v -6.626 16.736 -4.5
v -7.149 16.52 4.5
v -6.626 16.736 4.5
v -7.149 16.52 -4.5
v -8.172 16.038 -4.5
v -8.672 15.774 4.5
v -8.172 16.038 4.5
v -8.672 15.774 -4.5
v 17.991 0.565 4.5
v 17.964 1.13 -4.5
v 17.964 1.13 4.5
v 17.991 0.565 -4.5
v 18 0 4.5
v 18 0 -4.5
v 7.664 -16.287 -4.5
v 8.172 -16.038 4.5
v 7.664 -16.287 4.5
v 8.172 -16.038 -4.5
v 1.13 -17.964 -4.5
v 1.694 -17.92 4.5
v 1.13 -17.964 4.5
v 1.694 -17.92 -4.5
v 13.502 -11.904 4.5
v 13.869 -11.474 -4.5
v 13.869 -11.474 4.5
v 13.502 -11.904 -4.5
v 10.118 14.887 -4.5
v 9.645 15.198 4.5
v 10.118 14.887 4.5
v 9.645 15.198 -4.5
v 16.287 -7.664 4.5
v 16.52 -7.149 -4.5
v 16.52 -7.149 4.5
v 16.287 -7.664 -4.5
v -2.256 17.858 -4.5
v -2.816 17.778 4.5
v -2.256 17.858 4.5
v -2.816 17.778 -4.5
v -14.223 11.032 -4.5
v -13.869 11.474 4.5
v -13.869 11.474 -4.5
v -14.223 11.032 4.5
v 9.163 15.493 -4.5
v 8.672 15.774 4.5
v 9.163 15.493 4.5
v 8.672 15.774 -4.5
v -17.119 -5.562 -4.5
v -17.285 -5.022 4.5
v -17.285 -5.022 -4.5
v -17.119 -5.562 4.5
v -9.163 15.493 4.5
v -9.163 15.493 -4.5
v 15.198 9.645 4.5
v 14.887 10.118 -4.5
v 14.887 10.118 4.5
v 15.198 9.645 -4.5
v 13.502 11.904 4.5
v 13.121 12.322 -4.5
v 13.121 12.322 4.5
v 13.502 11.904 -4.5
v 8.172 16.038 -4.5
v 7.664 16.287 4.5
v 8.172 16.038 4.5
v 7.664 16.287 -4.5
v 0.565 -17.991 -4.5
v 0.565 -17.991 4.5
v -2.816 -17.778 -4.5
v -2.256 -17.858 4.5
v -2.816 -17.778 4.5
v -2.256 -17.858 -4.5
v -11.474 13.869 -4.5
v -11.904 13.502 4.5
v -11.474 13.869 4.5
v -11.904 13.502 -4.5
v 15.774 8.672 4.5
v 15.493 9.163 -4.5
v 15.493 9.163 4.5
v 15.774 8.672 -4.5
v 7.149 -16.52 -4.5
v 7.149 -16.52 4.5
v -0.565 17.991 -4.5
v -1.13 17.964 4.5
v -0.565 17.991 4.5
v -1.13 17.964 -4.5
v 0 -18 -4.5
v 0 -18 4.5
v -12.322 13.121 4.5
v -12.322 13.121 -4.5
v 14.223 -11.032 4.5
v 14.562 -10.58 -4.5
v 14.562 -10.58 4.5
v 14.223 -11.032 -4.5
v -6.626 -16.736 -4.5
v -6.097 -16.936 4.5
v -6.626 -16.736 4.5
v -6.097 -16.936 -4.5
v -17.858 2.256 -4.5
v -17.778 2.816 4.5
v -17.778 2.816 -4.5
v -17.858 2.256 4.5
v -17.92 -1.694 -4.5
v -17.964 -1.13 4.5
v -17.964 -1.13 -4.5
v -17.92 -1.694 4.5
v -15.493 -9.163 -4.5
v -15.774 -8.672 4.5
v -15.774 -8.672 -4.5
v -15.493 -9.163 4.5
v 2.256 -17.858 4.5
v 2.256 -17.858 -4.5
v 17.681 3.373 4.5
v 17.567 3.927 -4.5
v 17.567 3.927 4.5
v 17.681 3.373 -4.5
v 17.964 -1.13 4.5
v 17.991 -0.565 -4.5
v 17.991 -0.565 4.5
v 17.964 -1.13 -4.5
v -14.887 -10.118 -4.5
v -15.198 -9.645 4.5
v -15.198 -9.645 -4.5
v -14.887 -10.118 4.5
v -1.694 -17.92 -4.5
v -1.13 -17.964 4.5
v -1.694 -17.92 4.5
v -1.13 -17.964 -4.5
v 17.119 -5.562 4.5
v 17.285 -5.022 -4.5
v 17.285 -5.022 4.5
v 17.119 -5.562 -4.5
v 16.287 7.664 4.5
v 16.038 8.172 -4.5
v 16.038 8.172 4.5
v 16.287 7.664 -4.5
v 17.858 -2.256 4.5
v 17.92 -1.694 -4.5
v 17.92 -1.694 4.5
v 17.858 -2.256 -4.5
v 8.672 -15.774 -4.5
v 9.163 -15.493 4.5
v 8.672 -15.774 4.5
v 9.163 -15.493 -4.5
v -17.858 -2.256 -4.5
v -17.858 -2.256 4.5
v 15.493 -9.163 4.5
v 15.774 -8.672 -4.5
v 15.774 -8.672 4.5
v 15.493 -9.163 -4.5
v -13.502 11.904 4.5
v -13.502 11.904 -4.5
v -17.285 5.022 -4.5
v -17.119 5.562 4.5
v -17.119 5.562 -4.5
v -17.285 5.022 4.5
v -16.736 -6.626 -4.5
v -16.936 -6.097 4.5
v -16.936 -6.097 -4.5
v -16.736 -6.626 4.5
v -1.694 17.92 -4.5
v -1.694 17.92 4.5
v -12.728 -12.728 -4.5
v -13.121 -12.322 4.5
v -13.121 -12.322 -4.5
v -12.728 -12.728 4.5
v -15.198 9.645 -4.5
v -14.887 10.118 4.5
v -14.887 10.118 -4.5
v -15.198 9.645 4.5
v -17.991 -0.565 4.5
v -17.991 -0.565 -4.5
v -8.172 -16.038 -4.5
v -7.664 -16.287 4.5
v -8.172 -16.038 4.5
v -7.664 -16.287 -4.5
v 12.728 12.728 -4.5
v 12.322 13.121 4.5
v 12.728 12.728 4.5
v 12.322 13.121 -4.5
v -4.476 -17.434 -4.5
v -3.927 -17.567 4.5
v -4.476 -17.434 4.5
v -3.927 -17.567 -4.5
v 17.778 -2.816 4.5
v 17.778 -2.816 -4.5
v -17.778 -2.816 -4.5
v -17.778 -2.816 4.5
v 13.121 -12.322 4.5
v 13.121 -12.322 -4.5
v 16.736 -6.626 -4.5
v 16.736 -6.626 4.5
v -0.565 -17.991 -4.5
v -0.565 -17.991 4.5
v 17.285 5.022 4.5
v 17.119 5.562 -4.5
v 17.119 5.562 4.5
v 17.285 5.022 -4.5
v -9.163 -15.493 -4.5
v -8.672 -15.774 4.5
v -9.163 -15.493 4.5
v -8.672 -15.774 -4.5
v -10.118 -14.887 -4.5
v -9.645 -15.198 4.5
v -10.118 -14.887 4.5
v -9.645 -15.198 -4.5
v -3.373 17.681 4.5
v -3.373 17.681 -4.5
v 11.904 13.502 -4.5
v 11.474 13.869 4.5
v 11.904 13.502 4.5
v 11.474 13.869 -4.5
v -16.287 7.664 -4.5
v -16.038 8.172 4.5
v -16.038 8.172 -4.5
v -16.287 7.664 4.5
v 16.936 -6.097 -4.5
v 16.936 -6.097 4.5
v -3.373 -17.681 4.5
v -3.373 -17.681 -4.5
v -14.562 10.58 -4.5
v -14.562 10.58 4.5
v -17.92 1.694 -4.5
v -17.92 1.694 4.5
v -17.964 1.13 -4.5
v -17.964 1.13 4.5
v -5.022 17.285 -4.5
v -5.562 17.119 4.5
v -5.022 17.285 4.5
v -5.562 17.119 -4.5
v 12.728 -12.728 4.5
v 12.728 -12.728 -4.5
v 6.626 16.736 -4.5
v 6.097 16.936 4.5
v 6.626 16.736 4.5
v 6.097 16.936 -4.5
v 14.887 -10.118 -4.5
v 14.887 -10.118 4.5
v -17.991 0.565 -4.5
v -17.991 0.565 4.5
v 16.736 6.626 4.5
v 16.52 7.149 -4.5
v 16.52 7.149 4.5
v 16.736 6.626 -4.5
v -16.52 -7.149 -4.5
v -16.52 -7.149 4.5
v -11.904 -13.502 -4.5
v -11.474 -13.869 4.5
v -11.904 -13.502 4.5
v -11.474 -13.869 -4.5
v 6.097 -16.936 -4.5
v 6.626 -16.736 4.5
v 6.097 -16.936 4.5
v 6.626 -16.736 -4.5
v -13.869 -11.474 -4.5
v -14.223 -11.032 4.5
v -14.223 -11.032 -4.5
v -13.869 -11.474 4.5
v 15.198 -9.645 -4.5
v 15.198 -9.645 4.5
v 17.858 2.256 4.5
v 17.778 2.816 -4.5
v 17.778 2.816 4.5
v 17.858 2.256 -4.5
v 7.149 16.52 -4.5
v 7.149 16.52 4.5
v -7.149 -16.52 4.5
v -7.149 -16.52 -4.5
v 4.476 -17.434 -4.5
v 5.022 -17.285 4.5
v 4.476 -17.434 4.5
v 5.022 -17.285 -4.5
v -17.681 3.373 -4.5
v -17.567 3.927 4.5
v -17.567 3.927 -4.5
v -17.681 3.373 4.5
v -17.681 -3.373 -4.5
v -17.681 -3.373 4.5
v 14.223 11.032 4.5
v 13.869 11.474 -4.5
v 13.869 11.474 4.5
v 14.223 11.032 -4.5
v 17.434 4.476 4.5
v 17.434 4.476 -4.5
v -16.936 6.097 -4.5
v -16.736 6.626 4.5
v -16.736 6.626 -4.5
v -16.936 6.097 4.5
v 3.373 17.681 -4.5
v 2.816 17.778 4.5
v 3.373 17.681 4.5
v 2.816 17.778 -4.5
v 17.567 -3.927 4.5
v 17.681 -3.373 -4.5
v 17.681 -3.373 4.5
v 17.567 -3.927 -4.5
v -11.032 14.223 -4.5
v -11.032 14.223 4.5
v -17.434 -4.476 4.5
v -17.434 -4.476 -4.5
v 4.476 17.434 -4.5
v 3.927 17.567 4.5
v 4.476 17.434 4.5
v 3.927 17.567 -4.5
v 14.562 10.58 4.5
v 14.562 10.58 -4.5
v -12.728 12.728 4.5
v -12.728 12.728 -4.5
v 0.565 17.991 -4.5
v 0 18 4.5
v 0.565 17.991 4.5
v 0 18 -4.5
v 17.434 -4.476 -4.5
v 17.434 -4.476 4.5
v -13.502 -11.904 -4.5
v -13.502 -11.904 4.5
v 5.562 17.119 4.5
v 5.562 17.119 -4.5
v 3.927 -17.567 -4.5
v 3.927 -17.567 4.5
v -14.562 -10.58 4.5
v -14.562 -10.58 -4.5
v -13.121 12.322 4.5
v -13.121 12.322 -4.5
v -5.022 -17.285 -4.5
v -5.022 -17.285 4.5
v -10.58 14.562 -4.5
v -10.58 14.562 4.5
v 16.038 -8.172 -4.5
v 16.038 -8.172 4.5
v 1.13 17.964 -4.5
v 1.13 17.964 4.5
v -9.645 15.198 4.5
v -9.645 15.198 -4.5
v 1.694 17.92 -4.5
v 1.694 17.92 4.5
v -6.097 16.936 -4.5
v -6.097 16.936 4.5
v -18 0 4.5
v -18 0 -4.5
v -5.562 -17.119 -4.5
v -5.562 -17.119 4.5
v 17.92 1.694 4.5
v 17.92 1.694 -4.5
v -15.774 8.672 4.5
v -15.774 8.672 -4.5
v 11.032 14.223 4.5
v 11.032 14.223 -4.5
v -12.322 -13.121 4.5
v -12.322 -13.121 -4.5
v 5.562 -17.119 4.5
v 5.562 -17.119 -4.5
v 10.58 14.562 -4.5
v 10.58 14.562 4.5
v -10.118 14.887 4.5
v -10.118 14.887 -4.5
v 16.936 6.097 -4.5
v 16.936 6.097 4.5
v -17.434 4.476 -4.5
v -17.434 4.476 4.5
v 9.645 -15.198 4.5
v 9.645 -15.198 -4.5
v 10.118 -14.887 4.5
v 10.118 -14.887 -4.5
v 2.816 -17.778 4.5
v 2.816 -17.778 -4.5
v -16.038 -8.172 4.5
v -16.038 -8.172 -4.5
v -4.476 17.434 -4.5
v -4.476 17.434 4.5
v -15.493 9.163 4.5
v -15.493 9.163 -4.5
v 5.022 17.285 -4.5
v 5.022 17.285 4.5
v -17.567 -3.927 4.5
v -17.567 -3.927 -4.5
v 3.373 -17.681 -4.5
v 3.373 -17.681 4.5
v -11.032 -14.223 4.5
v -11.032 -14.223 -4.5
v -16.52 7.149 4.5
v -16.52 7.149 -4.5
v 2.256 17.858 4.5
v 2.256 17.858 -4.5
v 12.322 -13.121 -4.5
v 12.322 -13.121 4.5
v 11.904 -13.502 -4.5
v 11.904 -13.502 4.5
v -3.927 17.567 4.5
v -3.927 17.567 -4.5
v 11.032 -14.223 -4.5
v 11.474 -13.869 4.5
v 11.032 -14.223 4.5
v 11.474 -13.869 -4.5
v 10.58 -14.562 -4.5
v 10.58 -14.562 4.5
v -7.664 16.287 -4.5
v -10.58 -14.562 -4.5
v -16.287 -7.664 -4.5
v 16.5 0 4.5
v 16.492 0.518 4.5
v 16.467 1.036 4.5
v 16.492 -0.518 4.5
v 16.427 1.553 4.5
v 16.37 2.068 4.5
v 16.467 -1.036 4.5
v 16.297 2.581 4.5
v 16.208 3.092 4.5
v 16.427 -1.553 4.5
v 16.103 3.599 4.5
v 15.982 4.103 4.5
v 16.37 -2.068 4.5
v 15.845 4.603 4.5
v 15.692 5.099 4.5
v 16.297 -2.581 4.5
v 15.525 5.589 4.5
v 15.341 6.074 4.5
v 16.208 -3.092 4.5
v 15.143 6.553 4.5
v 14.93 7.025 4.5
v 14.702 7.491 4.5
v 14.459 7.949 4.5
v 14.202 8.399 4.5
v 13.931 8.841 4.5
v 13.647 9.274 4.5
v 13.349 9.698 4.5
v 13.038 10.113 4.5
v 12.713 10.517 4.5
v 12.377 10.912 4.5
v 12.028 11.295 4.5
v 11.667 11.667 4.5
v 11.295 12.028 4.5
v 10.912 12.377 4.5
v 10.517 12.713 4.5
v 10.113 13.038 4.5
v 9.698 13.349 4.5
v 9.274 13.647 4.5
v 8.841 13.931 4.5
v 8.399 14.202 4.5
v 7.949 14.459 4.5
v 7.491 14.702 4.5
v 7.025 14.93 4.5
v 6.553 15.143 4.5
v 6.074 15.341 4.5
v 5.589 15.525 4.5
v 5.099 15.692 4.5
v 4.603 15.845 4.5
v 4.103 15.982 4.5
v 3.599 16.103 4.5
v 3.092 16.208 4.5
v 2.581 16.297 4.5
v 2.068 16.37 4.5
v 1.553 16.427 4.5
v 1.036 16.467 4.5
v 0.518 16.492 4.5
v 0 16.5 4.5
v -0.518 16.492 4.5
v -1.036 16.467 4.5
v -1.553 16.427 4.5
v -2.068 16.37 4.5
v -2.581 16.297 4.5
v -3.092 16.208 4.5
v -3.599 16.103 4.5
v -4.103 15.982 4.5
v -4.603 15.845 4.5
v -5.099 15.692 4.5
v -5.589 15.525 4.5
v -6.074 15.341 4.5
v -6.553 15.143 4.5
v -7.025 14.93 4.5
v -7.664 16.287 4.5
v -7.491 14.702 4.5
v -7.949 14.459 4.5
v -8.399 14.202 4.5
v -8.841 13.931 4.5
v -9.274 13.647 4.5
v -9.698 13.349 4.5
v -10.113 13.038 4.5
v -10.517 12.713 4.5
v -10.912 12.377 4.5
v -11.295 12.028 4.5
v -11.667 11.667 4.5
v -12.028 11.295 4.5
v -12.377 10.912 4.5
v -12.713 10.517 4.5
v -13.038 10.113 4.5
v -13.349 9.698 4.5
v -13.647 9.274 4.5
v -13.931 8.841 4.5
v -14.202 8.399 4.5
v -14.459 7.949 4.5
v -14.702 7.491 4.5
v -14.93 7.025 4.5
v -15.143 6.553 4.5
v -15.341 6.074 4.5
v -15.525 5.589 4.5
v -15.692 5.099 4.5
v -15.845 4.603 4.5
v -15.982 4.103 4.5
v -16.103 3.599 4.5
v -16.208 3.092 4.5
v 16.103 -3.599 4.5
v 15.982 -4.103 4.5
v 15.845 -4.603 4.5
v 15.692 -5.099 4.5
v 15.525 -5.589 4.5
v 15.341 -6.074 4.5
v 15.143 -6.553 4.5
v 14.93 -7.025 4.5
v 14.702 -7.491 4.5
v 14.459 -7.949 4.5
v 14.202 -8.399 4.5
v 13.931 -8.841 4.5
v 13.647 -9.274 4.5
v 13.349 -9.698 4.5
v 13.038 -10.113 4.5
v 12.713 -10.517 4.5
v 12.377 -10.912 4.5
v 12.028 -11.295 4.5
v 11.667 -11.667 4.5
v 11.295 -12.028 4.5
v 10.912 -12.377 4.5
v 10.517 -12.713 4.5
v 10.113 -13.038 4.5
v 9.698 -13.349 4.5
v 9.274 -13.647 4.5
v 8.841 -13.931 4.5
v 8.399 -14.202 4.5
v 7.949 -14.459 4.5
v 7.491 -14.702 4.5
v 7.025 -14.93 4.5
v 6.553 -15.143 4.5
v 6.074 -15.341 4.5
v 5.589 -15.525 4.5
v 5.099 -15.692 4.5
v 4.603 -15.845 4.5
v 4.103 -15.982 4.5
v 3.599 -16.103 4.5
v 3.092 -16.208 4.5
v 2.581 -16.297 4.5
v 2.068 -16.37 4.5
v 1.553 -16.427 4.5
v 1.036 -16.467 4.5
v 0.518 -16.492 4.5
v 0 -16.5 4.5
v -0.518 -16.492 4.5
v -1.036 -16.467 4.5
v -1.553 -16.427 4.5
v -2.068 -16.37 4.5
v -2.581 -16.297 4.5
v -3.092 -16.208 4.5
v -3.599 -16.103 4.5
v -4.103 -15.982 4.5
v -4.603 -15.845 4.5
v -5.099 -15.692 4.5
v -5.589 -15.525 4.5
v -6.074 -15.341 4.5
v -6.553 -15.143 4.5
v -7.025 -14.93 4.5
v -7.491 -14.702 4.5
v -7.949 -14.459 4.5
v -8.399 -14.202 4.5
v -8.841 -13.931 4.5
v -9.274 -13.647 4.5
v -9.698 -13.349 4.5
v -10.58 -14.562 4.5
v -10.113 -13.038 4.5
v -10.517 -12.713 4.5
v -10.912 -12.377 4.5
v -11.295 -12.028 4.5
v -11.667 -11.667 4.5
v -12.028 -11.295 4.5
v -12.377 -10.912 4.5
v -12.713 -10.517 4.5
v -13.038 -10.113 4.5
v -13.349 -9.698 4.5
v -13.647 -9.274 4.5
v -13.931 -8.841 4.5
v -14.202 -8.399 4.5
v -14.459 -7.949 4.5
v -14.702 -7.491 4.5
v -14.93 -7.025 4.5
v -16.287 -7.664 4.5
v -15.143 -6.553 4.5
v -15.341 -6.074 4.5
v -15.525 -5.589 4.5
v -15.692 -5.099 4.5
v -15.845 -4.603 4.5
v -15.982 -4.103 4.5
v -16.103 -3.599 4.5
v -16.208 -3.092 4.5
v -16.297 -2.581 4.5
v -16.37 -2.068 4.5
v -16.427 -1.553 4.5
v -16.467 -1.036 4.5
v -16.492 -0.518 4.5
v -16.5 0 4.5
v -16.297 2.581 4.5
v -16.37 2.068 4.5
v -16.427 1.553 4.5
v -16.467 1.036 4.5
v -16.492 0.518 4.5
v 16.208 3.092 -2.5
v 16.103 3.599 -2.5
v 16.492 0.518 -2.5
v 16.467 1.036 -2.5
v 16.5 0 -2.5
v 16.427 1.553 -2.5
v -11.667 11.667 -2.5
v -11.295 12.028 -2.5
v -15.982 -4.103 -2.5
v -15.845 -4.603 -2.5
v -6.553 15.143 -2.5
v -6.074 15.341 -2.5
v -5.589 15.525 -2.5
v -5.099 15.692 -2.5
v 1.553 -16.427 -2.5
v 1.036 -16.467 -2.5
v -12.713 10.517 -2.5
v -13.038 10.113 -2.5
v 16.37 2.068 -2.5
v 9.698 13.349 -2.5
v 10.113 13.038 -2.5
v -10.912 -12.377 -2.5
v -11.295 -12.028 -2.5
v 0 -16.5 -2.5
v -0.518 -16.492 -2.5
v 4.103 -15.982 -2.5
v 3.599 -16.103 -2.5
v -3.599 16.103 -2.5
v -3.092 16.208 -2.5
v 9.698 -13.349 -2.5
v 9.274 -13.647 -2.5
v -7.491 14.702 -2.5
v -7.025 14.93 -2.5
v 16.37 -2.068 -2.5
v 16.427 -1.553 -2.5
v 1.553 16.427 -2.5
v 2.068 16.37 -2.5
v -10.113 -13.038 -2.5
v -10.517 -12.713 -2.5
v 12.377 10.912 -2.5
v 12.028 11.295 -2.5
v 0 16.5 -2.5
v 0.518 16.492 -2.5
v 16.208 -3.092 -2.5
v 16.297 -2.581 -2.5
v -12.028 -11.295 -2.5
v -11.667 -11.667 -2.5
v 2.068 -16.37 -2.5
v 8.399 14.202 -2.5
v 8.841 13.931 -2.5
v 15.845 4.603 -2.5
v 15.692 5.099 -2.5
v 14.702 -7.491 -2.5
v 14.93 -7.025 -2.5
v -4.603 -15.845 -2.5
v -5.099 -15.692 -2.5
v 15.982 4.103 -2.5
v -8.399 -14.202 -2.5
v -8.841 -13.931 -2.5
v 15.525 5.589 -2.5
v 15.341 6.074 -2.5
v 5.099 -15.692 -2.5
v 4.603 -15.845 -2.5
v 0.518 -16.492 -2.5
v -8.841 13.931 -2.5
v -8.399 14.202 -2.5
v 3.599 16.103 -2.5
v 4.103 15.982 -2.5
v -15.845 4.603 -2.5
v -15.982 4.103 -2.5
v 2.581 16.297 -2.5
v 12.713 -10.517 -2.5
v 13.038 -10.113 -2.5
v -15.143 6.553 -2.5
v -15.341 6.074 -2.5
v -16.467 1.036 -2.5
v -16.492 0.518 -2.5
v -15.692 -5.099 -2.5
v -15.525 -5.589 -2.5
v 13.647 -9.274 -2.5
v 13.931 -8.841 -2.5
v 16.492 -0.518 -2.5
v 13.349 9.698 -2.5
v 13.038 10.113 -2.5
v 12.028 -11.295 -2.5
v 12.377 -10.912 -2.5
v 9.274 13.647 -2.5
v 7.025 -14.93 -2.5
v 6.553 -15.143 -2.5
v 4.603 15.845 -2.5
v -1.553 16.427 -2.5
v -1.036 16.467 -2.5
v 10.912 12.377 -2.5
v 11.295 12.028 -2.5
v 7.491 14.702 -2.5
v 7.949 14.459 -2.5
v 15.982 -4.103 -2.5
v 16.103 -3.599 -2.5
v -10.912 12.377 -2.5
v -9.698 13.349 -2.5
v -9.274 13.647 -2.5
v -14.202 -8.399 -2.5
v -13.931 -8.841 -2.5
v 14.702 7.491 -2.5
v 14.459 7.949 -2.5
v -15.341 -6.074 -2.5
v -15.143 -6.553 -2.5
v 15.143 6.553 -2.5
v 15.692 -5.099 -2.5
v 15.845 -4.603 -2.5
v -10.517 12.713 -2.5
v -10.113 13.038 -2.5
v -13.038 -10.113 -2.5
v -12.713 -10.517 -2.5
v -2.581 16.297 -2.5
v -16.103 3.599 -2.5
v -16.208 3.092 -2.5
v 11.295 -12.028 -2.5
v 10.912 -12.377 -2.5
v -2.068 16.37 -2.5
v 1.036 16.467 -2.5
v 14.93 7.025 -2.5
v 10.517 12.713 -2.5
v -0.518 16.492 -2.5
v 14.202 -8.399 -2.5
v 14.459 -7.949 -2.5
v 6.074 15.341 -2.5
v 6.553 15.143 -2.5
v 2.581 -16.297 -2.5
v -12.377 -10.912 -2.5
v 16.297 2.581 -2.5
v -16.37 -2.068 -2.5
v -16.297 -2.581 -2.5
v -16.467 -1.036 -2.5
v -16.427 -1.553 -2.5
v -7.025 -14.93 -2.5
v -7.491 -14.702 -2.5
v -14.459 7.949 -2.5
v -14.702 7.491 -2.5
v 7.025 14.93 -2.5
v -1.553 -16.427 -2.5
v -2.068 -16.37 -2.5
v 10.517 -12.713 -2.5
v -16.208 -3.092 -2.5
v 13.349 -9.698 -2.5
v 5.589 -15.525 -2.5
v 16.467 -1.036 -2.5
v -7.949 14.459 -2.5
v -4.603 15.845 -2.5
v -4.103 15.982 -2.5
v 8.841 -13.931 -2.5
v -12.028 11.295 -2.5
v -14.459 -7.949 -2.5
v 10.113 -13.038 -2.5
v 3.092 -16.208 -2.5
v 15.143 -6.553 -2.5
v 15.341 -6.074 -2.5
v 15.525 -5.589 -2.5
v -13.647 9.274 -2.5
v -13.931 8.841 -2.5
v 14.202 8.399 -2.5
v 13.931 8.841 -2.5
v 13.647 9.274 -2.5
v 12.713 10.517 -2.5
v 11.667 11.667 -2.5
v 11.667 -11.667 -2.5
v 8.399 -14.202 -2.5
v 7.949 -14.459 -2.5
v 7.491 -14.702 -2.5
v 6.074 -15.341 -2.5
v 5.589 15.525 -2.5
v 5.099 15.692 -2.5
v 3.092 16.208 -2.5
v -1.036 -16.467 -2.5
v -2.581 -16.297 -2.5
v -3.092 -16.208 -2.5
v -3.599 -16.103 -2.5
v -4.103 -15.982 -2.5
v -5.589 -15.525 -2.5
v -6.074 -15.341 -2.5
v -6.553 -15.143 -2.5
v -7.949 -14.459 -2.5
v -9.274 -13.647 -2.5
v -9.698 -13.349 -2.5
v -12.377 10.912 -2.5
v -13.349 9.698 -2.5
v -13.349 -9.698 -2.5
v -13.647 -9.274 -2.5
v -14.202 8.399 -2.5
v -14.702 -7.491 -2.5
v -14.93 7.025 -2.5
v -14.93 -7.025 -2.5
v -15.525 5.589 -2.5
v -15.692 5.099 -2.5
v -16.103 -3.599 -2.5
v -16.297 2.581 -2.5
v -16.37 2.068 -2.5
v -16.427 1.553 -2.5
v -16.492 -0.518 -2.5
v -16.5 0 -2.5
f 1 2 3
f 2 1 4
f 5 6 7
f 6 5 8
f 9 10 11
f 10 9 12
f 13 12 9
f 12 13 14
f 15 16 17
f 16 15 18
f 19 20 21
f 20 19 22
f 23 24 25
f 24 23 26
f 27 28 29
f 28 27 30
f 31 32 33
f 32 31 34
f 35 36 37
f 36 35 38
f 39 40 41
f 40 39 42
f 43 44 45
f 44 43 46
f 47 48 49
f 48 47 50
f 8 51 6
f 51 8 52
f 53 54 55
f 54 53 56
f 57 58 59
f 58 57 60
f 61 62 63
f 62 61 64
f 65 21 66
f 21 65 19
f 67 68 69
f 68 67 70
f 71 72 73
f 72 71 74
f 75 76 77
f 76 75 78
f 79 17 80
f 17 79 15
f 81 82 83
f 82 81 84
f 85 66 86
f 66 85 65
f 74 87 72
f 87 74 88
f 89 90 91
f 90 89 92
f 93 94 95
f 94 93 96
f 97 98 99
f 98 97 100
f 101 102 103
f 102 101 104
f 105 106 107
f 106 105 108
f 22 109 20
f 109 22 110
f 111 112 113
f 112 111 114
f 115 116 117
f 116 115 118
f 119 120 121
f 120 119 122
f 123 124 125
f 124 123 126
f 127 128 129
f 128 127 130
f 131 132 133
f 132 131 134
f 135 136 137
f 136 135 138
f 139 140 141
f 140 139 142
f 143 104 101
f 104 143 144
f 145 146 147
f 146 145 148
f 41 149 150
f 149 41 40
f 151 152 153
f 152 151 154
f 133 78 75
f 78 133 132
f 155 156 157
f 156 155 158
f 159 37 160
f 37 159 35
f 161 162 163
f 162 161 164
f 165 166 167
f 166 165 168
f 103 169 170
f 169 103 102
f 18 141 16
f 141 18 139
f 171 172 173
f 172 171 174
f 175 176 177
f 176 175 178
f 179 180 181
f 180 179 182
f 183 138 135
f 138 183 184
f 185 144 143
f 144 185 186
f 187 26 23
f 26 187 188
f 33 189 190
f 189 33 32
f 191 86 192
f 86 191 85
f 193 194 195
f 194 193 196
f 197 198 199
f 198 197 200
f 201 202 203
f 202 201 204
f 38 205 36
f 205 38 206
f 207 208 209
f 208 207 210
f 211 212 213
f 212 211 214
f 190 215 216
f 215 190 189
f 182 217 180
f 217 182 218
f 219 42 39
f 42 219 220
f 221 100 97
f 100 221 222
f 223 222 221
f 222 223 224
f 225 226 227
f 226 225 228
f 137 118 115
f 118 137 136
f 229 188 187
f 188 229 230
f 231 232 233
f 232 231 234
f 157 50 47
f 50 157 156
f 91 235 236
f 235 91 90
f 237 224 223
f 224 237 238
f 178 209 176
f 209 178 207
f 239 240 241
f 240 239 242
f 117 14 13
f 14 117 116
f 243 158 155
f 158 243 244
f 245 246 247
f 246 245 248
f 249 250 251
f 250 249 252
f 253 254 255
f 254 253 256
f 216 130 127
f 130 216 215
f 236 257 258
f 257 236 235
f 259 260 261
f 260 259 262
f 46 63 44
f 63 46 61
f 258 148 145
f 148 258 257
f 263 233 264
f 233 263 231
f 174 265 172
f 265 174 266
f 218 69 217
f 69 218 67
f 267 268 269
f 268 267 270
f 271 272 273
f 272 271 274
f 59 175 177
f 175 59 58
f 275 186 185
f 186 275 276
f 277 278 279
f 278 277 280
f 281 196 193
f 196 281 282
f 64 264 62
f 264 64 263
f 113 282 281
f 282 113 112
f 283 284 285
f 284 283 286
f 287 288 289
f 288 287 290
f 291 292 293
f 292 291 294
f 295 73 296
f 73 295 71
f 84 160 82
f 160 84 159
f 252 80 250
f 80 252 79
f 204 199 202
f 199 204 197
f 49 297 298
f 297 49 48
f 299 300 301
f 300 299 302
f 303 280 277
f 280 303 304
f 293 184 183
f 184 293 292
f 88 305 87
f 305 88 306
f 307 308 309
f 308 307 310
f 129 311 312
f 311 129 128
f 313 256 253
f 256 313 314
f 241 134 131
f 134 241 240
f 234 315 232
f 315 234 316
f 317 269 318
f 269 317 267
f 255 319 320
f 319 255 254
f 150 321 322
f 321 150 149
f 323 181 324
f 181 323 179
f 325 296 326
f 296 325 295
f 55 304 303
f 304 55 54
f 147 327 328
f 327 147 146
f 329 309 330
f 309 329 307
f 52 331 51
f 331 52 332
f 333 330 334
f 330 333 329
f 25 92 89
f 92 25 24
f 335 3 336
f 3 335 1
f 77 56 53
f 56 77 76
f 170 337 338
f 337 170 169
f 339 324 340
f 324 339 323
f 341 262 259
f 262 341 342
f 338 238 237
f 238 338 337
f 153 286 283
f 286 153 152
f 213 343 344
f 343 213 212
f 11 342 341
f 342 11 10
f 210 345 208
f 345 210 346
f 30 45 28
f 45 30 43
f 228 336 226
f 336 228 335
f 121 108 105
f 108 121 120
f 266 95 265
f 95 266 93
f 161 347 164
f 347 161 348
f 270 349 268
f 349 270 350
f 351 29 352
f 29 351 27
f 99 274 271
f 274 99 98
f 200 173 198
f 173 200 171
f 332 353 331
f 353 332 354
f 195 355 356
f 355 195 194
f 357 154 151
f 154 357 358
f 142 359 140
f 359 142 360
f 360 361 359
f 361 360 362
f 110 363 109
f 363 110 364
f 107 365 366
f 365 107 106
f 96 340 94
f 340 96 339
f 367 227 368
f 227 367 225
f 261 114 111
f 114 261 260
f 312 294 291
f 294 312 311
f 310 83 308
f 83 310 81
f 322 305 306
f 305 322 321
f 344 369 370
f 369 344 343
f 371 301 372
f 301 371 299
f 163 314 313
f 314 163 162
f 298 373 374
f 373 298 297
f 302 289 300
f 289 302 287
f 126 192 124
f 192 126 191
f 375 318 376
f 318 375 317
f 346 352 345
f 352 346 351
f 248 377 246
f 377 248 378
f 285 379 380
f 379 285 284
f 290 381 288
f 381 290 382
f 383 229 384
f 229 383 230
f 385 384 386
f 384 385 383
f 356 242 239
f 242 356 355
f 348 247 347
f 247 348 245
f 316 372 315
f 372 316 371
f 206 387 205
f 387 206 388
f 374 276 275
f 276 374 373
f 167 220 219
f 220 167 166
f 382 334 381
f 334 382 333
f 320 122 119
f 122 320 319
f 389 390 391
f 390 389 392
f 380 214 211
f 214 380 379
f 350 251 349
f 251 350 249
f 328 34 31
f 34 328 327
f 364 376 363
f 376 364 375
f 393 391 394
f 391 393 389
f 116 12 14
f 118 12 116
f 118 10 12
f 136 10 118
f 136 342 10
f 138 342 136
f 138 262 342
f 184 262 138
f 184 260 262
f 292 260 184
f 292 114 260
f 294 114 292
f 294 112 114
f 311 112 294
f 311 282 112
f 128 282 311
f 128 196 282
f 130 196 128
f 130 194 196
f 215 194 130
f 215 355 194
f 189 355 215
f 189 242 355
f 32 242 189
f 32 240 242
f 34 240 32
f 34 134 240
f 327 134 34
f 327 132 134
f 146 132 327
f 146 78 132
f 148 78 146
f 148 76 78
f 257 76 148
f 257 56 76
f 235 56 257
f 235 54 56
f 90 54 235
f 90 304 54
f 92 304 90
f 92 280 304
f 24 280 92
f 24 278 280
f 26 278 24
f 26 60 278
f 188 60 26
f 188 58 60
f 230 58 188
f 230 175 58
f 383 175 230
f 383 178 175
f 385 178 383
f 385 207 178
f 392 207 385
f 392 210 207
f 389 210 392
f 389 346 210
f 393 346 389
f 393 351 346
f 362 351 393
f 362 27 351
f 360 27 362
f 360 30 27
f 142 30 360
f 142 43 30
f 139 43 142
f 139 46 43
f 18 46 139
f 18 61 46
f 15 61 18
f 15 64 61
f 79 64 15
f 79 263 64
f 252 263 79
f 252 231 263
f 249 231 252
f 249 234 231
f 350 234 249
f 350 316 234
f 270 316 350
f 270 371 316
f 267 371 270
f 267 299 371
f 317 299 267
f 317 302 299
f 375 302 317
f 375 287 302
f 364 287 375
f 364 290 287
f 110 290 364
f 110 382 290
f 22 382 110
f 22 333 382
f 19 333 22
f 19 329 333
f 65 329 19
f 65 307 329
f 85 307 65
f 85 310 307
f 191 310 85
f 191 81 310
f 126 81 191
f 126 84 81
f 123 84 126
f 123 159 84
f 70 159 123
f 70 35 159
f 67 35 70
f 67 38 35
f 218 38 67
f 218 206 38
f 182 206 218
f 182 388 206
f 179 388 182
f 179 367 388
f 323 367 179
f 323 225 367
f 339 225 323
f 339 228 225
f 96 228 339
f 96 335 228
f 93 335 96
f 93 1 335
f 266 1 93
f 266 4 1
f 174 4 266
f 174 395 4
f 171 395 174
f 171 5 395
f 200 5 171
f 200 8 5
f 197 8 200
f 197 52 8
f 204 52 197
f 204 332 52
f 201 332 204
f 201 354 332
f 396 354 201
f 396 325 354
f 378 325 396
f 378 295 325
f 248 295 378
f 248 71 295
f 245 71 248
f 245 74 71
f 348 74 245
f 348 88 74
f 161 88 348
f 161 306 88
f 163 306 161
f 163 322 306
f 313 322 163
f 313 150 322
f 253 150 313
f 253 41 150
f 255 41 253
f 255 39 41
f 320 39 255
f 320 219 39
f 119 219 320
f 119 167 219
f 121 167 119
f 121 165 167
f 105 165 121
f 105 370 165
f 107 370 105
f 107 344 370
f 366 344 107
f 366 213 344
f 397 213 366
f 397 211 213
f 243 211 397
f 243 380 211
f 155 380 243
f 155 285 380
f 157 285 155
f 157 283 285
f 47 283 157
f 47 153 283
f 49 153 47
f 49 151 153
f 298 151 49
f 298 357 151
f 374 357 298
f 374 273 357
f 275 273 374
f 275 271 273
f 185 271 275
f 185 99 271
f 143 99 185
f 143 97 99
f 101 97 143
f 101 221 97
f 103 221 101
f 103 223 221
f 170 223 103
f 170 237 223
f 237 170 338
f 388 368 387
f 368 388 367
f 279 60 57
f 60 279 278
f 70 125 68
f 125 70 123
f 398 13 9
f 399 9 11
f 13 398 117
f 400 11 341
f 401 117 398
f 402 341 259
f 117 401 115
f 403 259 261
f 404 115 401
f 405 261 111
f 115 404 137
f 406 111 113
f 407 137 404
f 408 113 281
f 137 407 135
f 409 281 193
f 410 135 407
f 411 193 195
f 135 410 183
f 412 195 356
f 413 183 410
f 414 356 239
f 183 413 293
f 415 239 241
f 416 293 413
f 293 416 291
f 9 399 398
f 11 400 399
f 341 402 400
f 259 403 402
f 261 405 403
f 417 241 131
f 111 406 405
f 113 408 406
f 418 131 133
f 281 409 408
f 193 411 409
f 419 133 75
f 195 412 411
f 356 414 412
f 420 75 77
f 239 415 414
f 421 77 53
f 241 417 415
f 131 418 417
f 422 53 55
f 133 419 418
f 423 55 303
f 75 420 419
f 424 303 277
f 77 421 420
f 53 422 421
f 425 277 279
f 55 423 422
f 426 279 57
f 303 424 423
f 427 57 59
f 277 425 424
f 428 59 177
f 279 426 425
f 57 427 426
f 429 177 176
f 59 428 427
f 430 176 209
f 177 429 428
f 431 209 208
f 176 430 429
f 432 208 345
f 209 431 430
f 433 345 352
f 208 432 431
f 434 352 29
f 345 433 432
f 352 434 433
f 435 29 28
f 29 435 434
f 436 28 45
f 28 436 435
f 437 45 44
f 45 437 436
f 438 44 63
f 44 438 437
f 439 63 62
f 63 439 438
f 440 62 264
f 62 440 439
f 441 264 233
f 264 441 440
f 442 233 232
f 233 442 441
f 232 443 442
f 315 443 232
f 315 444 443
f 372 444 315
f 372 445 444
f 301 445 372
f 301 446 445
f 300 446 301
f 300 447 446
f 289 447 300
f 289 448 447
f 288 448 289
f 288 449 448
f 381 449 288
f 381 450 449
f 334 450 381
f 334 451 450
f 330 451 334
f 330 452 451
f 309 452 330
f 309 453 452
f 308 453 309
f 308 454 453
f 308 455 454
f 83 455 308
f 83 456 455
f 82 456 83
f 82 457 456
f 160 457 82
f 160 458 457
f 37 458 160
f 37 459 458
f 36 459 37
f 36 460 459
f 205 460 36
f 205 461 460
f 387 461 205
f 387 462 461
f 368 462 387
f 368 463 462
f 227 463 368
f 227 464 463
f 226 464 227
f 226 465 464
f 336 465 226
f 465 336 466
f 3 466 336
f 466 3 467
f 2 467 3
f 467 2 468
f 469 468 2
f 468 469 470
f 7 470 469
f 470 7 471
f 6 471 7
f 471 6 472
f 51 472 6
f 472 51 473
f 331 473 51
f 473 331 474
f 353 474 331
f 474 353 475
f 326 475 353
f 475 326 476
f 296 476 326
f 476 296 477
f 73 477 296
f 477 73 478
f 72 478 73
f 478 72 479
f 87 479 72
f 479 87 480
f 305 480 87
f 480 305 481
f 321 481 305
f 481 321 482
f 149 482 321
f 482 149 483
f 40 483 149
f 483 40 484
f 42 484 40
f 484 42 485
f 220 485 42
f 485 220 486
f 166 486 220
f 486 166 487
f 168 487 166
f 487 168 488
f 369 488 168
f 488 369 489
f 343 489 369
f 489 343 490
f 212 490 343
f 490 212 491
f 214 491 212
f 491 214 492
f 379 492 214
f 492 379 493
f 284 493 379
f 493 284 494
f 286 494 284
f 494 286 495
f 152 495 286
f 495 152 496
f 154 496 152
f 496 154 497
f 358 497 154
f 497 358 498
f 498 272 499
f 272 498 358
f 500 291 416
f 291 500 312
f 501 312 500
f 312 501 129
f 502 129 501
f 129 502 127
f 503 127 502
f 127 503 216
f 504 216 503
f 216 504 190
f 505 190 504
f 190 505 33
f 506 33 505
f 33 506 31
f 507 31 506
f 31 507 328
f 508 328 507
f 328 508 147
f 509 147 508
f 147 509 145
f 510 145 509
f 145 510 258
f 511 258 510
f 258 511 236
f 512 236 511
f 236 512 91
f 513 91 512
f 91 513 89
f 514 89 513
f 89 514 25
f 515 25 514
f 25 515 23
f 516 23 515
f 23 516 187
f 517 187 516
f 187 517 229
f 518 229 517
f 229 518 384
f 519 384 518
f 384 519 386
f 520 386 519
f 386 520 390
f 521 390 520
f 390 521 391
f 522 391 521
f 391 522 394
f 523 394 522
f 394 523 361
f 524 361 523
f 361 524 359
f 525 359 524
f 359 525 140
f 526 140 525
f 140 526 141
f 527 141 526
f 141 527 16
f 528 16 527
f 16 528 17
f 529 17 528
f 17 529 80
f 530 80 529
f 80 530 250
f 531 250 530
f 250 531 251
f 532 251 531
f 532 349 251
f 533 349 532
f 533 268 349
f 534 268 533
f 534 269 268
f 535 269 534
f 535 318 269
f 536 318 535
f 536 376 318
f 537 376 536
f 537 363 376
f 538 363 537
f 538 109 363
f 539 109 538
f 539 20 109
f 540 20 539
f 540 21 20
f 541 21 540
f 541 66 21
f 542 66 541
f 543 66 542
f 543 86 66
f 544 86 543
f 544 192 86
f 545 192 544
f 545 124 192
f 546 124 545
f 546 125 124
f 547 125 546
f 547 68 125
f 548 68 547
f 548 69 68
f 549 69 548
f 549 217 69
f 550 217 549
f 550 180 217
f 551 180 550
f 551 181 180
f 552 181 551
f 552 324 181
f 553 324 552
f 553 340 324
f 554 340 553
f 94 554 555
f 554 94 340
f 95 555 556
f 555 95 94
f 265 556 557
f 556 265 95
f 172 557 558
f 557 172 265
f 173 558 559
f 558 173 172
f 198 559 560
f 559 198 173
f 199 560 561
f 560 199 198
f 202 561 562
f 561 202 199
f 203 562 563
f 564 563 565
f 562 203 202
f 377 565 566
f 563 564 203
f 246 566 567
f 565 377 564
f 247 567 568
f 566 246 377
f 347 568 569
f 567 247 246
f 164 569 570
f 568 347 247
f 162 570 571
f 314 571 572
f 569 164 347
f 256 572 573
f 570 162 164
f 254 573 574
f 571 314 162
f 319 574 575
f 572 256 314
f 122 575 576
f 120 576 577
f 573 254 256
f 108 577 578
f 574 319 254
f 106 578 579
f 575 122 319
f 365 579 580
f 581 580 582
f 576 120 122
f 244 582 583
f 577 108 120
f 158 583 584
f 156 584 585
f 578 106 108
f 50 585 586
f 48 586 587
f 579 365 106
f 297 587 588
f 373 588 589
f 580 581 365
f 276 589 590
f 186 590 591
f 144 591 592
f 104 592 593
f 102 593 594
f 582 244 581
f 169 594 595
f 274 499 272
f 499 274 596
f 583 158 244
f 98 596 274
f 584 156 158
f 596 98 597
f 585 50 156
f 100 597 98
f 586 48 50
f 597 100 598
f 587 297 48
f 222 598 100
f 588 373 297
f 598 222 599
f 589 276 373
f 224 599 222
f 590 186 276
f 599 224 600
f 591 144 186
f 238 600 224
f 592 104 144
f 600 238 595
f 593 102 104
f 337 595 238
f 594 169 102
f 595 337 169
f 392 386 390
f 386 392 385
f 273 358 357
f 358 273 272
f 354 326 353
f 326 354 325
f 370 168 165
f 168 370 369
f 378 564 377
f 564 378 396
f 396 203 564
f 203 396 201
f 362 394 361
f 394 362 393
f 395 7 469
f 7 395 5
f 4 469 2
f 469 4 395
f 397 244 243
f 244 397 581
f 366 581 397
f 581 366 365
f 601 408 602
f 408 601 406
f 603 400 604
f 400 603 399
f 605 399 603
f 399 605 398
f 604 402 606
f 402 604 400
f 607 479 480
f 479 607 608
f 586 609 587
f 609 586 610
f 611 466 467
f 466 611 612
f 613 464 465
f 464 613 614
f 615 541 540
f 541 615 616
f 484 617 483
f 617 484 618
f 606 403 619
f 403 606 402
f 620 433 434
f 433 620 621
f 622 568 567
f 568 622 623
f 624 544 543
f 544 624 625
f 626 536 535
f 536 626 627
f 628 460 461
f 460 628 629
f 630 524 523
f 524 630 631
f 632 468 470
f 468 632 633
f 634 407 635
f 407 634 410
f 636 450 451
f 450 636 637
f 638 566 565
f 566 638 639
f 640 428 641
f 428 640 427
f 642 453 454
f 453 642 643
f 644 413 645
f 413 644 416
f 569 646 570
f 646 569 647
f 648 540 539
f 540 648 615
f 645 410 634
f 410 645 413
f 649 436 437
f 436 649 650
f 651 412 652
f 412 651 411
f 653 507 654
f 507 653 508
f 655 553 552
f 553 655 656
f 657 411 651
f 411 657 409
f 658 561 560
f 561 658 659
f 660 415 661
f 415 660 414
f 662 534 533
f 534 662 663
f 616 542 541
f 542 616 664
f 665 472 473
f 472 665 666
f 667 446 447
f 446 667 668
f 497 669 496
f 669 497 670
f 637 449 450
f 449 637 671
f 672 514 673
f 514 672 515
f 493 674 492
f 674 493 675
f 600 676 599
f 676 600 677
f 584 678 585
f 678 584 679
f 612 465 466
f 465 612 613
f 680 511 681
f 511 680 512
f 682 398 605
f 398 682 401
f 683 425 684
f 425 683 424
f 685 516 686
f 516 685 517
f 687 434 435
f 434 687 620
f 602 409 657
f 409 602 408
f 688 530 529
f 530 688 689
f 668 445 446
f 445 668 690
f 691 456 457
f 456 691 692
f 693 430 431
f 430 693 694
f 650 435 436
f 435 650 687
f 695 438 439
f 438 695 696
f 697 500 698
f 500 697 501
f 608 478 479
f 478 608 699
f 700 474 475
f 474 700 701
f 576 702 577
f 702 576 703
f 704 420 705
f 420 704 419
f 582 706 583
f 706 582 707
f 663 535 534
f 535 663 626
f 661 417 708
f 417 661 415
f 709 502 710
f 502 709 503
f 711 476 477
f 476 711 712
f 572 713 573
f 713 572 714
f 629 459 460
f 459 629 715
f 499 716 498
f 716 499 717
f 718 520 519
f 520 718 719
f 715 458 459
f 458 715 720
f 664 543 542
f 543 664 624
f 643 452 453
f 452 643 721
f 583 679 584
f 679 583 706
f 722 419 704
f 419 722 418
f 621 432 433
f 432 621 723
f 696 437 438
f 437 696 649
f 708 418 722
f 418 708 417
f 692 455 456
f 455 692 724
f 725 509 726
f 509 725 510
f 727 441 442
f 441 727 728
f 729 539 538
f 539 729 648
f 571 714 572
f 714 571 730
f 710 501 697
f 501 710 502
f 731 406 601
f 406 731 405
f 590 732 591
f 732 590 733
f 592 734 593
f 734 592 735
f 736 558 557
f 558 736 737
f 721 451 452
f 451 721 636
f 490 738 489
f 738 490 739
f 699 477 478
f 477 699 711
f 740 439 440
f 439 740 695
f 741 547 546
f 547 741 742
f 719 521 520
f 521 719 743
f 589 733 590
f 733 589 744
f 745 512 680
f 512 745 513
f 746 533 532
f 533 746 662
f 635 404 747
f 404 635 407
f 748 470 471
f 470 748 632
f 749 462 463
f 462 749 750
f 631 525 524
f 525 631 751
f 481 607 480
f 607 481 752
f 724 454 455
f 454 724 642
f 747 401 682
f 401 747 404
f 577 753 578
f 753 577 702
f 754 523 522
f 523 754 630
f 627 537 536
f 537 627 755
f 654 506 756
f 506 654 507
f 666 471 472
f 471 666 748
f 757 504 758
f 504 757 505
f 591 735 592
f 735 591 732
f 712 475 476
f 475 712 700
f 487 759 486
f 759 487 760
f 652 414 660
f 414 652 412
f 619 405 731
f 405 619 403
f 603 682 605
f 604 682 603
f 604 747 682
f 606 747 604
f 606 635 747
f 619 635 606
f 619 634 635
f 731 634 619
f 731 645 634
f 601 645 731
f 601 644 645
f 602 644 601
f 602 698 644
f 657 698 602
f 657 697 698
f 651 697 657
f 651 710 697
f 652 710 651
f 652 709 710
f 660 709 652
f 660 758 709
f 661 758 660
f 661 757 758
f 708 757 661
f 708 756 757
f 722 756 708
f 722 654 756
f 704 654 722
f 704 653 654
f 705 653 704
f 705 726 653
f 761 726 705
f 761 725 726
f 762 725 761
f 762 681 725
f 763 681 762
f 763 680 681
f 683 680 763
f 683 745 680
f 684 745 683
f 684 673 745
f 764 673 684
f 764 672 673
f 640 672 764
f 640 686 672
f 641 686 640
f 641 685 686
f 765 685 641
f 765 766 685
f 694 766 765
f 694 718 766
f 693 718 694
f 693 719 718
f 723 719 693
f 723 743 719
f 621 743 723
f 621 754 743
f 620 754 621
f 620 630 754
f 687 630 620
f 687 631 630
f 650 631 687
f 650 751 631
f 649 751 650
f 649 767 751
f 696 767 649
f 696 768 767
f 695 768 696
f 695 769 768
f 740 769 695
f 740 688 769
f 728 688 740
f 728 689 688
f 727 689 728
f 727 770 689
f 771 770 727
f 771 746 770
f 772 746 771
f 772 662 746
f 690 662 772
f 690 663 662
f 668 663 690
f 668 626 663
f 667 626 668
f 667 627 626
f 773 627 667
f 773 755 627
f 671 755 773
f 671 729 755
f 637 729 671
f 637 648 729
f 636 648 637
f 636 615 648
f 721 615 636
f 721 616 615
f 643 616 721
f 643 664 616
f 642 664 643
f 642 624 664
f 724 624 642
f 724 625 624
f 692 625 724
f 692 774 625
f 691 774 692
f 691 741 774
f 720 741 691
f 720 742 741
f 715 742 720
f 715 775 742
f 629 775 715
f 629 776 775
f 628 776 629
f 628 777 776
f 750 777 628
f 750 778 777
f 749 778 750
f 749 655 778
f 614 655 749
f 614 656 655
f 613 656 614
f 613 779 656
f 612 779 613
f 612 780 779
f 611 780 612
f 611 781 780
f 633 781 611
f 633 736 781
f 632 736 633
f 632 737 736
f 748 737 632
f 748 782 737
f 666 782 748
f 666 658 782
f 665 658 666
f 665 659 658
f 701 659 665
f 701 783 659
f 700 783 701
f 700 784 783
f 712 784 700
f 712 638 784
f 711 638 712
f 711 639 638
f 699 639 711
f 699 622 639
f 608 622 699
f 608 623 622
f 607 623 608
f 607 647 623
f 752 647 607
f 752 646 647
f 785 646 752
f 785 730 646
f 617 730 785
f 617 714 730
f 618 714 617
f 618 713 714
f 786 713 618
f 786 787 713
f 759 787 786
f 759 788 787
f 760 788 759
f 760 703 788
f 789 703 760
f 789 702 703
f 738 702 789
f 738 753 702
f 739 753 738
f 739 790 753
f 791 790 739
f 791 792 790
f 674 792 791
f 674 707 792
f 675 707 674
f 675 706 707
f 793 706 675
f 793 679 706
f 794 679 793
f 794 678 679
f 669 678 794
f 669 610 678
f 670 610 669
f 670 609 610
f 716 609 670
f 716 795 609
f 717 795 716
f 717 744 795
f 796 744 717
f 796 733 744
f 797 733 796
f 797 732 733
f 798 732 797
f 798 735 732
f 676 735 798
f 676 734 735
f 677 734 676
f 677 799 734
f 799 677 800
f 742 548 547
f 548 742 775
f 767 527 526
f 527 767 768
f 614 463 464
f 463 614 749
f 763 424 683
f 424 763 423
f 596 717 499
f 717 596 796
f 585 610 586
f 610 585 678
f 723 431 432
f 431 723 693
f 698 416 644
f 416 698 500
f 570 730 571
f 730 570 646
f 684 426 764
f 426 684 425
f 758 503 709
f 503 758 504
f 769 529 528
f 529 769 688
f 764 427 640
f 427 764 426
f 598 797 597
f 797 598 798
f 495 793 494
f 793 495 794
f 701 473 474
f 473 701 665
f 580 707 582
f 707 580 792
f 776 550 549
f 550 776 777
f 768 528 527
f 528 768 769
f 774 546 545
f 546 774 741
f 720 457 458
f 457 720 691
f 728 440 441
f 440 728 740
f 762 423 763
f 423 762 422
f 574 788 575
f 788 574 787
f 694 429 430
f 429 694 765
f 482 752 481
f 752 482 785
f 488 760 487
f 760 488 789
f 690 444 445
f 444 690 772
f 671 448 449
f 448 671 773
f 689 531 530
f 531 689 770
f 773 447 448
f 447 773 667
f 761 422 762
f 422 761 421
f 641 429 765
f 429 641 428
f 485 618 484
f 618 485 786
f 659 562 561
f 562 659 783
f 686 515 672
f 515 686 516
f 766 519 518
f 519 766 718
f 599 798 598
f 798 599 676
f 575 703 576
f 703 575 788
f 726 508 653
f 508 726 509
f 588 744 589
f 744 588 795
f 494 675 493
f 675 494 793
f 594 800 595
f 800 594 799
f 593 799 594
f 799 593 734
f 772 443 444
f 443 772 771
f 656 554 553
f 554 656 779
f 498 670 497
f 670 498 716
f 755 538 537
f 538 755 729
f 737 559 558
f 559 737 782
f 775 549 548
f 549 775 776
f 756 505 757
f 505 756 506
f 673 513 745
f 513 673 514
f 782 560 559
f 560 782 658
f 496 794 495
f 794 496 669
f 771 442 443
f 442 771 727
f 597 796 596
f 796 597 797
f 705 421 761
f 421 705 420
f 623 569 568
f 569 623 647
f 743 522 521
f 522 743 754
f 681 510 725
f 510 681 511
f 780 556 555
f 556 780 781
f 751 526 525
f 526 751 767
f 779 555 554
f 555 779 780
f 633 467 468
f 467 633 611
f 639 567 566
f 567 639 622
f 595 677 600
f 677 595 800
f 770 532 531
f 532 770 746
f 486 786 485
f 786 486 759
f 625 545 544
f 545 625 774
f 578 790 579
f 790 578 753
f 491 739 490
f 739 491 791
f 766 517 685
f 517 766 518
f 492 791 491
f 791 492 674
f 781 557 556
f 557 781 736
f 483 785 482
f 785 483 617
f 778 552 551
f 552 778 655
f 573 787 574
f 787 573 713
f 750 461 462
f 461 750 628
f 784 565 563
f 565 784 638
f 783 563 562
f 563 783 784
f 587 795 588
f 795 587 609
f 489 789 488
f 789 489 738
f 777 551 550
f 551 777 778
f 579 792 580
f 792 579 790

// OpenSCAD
$fn=200;
module lens_cap_back () {
    difference() {
        cylinder(r = 36 / 2, h = 9, center = true);
        translate([0, 0, 2]) cylinder(r = 33 / 2, h = 9, center = true);
    }
}

lens_cap_back();
